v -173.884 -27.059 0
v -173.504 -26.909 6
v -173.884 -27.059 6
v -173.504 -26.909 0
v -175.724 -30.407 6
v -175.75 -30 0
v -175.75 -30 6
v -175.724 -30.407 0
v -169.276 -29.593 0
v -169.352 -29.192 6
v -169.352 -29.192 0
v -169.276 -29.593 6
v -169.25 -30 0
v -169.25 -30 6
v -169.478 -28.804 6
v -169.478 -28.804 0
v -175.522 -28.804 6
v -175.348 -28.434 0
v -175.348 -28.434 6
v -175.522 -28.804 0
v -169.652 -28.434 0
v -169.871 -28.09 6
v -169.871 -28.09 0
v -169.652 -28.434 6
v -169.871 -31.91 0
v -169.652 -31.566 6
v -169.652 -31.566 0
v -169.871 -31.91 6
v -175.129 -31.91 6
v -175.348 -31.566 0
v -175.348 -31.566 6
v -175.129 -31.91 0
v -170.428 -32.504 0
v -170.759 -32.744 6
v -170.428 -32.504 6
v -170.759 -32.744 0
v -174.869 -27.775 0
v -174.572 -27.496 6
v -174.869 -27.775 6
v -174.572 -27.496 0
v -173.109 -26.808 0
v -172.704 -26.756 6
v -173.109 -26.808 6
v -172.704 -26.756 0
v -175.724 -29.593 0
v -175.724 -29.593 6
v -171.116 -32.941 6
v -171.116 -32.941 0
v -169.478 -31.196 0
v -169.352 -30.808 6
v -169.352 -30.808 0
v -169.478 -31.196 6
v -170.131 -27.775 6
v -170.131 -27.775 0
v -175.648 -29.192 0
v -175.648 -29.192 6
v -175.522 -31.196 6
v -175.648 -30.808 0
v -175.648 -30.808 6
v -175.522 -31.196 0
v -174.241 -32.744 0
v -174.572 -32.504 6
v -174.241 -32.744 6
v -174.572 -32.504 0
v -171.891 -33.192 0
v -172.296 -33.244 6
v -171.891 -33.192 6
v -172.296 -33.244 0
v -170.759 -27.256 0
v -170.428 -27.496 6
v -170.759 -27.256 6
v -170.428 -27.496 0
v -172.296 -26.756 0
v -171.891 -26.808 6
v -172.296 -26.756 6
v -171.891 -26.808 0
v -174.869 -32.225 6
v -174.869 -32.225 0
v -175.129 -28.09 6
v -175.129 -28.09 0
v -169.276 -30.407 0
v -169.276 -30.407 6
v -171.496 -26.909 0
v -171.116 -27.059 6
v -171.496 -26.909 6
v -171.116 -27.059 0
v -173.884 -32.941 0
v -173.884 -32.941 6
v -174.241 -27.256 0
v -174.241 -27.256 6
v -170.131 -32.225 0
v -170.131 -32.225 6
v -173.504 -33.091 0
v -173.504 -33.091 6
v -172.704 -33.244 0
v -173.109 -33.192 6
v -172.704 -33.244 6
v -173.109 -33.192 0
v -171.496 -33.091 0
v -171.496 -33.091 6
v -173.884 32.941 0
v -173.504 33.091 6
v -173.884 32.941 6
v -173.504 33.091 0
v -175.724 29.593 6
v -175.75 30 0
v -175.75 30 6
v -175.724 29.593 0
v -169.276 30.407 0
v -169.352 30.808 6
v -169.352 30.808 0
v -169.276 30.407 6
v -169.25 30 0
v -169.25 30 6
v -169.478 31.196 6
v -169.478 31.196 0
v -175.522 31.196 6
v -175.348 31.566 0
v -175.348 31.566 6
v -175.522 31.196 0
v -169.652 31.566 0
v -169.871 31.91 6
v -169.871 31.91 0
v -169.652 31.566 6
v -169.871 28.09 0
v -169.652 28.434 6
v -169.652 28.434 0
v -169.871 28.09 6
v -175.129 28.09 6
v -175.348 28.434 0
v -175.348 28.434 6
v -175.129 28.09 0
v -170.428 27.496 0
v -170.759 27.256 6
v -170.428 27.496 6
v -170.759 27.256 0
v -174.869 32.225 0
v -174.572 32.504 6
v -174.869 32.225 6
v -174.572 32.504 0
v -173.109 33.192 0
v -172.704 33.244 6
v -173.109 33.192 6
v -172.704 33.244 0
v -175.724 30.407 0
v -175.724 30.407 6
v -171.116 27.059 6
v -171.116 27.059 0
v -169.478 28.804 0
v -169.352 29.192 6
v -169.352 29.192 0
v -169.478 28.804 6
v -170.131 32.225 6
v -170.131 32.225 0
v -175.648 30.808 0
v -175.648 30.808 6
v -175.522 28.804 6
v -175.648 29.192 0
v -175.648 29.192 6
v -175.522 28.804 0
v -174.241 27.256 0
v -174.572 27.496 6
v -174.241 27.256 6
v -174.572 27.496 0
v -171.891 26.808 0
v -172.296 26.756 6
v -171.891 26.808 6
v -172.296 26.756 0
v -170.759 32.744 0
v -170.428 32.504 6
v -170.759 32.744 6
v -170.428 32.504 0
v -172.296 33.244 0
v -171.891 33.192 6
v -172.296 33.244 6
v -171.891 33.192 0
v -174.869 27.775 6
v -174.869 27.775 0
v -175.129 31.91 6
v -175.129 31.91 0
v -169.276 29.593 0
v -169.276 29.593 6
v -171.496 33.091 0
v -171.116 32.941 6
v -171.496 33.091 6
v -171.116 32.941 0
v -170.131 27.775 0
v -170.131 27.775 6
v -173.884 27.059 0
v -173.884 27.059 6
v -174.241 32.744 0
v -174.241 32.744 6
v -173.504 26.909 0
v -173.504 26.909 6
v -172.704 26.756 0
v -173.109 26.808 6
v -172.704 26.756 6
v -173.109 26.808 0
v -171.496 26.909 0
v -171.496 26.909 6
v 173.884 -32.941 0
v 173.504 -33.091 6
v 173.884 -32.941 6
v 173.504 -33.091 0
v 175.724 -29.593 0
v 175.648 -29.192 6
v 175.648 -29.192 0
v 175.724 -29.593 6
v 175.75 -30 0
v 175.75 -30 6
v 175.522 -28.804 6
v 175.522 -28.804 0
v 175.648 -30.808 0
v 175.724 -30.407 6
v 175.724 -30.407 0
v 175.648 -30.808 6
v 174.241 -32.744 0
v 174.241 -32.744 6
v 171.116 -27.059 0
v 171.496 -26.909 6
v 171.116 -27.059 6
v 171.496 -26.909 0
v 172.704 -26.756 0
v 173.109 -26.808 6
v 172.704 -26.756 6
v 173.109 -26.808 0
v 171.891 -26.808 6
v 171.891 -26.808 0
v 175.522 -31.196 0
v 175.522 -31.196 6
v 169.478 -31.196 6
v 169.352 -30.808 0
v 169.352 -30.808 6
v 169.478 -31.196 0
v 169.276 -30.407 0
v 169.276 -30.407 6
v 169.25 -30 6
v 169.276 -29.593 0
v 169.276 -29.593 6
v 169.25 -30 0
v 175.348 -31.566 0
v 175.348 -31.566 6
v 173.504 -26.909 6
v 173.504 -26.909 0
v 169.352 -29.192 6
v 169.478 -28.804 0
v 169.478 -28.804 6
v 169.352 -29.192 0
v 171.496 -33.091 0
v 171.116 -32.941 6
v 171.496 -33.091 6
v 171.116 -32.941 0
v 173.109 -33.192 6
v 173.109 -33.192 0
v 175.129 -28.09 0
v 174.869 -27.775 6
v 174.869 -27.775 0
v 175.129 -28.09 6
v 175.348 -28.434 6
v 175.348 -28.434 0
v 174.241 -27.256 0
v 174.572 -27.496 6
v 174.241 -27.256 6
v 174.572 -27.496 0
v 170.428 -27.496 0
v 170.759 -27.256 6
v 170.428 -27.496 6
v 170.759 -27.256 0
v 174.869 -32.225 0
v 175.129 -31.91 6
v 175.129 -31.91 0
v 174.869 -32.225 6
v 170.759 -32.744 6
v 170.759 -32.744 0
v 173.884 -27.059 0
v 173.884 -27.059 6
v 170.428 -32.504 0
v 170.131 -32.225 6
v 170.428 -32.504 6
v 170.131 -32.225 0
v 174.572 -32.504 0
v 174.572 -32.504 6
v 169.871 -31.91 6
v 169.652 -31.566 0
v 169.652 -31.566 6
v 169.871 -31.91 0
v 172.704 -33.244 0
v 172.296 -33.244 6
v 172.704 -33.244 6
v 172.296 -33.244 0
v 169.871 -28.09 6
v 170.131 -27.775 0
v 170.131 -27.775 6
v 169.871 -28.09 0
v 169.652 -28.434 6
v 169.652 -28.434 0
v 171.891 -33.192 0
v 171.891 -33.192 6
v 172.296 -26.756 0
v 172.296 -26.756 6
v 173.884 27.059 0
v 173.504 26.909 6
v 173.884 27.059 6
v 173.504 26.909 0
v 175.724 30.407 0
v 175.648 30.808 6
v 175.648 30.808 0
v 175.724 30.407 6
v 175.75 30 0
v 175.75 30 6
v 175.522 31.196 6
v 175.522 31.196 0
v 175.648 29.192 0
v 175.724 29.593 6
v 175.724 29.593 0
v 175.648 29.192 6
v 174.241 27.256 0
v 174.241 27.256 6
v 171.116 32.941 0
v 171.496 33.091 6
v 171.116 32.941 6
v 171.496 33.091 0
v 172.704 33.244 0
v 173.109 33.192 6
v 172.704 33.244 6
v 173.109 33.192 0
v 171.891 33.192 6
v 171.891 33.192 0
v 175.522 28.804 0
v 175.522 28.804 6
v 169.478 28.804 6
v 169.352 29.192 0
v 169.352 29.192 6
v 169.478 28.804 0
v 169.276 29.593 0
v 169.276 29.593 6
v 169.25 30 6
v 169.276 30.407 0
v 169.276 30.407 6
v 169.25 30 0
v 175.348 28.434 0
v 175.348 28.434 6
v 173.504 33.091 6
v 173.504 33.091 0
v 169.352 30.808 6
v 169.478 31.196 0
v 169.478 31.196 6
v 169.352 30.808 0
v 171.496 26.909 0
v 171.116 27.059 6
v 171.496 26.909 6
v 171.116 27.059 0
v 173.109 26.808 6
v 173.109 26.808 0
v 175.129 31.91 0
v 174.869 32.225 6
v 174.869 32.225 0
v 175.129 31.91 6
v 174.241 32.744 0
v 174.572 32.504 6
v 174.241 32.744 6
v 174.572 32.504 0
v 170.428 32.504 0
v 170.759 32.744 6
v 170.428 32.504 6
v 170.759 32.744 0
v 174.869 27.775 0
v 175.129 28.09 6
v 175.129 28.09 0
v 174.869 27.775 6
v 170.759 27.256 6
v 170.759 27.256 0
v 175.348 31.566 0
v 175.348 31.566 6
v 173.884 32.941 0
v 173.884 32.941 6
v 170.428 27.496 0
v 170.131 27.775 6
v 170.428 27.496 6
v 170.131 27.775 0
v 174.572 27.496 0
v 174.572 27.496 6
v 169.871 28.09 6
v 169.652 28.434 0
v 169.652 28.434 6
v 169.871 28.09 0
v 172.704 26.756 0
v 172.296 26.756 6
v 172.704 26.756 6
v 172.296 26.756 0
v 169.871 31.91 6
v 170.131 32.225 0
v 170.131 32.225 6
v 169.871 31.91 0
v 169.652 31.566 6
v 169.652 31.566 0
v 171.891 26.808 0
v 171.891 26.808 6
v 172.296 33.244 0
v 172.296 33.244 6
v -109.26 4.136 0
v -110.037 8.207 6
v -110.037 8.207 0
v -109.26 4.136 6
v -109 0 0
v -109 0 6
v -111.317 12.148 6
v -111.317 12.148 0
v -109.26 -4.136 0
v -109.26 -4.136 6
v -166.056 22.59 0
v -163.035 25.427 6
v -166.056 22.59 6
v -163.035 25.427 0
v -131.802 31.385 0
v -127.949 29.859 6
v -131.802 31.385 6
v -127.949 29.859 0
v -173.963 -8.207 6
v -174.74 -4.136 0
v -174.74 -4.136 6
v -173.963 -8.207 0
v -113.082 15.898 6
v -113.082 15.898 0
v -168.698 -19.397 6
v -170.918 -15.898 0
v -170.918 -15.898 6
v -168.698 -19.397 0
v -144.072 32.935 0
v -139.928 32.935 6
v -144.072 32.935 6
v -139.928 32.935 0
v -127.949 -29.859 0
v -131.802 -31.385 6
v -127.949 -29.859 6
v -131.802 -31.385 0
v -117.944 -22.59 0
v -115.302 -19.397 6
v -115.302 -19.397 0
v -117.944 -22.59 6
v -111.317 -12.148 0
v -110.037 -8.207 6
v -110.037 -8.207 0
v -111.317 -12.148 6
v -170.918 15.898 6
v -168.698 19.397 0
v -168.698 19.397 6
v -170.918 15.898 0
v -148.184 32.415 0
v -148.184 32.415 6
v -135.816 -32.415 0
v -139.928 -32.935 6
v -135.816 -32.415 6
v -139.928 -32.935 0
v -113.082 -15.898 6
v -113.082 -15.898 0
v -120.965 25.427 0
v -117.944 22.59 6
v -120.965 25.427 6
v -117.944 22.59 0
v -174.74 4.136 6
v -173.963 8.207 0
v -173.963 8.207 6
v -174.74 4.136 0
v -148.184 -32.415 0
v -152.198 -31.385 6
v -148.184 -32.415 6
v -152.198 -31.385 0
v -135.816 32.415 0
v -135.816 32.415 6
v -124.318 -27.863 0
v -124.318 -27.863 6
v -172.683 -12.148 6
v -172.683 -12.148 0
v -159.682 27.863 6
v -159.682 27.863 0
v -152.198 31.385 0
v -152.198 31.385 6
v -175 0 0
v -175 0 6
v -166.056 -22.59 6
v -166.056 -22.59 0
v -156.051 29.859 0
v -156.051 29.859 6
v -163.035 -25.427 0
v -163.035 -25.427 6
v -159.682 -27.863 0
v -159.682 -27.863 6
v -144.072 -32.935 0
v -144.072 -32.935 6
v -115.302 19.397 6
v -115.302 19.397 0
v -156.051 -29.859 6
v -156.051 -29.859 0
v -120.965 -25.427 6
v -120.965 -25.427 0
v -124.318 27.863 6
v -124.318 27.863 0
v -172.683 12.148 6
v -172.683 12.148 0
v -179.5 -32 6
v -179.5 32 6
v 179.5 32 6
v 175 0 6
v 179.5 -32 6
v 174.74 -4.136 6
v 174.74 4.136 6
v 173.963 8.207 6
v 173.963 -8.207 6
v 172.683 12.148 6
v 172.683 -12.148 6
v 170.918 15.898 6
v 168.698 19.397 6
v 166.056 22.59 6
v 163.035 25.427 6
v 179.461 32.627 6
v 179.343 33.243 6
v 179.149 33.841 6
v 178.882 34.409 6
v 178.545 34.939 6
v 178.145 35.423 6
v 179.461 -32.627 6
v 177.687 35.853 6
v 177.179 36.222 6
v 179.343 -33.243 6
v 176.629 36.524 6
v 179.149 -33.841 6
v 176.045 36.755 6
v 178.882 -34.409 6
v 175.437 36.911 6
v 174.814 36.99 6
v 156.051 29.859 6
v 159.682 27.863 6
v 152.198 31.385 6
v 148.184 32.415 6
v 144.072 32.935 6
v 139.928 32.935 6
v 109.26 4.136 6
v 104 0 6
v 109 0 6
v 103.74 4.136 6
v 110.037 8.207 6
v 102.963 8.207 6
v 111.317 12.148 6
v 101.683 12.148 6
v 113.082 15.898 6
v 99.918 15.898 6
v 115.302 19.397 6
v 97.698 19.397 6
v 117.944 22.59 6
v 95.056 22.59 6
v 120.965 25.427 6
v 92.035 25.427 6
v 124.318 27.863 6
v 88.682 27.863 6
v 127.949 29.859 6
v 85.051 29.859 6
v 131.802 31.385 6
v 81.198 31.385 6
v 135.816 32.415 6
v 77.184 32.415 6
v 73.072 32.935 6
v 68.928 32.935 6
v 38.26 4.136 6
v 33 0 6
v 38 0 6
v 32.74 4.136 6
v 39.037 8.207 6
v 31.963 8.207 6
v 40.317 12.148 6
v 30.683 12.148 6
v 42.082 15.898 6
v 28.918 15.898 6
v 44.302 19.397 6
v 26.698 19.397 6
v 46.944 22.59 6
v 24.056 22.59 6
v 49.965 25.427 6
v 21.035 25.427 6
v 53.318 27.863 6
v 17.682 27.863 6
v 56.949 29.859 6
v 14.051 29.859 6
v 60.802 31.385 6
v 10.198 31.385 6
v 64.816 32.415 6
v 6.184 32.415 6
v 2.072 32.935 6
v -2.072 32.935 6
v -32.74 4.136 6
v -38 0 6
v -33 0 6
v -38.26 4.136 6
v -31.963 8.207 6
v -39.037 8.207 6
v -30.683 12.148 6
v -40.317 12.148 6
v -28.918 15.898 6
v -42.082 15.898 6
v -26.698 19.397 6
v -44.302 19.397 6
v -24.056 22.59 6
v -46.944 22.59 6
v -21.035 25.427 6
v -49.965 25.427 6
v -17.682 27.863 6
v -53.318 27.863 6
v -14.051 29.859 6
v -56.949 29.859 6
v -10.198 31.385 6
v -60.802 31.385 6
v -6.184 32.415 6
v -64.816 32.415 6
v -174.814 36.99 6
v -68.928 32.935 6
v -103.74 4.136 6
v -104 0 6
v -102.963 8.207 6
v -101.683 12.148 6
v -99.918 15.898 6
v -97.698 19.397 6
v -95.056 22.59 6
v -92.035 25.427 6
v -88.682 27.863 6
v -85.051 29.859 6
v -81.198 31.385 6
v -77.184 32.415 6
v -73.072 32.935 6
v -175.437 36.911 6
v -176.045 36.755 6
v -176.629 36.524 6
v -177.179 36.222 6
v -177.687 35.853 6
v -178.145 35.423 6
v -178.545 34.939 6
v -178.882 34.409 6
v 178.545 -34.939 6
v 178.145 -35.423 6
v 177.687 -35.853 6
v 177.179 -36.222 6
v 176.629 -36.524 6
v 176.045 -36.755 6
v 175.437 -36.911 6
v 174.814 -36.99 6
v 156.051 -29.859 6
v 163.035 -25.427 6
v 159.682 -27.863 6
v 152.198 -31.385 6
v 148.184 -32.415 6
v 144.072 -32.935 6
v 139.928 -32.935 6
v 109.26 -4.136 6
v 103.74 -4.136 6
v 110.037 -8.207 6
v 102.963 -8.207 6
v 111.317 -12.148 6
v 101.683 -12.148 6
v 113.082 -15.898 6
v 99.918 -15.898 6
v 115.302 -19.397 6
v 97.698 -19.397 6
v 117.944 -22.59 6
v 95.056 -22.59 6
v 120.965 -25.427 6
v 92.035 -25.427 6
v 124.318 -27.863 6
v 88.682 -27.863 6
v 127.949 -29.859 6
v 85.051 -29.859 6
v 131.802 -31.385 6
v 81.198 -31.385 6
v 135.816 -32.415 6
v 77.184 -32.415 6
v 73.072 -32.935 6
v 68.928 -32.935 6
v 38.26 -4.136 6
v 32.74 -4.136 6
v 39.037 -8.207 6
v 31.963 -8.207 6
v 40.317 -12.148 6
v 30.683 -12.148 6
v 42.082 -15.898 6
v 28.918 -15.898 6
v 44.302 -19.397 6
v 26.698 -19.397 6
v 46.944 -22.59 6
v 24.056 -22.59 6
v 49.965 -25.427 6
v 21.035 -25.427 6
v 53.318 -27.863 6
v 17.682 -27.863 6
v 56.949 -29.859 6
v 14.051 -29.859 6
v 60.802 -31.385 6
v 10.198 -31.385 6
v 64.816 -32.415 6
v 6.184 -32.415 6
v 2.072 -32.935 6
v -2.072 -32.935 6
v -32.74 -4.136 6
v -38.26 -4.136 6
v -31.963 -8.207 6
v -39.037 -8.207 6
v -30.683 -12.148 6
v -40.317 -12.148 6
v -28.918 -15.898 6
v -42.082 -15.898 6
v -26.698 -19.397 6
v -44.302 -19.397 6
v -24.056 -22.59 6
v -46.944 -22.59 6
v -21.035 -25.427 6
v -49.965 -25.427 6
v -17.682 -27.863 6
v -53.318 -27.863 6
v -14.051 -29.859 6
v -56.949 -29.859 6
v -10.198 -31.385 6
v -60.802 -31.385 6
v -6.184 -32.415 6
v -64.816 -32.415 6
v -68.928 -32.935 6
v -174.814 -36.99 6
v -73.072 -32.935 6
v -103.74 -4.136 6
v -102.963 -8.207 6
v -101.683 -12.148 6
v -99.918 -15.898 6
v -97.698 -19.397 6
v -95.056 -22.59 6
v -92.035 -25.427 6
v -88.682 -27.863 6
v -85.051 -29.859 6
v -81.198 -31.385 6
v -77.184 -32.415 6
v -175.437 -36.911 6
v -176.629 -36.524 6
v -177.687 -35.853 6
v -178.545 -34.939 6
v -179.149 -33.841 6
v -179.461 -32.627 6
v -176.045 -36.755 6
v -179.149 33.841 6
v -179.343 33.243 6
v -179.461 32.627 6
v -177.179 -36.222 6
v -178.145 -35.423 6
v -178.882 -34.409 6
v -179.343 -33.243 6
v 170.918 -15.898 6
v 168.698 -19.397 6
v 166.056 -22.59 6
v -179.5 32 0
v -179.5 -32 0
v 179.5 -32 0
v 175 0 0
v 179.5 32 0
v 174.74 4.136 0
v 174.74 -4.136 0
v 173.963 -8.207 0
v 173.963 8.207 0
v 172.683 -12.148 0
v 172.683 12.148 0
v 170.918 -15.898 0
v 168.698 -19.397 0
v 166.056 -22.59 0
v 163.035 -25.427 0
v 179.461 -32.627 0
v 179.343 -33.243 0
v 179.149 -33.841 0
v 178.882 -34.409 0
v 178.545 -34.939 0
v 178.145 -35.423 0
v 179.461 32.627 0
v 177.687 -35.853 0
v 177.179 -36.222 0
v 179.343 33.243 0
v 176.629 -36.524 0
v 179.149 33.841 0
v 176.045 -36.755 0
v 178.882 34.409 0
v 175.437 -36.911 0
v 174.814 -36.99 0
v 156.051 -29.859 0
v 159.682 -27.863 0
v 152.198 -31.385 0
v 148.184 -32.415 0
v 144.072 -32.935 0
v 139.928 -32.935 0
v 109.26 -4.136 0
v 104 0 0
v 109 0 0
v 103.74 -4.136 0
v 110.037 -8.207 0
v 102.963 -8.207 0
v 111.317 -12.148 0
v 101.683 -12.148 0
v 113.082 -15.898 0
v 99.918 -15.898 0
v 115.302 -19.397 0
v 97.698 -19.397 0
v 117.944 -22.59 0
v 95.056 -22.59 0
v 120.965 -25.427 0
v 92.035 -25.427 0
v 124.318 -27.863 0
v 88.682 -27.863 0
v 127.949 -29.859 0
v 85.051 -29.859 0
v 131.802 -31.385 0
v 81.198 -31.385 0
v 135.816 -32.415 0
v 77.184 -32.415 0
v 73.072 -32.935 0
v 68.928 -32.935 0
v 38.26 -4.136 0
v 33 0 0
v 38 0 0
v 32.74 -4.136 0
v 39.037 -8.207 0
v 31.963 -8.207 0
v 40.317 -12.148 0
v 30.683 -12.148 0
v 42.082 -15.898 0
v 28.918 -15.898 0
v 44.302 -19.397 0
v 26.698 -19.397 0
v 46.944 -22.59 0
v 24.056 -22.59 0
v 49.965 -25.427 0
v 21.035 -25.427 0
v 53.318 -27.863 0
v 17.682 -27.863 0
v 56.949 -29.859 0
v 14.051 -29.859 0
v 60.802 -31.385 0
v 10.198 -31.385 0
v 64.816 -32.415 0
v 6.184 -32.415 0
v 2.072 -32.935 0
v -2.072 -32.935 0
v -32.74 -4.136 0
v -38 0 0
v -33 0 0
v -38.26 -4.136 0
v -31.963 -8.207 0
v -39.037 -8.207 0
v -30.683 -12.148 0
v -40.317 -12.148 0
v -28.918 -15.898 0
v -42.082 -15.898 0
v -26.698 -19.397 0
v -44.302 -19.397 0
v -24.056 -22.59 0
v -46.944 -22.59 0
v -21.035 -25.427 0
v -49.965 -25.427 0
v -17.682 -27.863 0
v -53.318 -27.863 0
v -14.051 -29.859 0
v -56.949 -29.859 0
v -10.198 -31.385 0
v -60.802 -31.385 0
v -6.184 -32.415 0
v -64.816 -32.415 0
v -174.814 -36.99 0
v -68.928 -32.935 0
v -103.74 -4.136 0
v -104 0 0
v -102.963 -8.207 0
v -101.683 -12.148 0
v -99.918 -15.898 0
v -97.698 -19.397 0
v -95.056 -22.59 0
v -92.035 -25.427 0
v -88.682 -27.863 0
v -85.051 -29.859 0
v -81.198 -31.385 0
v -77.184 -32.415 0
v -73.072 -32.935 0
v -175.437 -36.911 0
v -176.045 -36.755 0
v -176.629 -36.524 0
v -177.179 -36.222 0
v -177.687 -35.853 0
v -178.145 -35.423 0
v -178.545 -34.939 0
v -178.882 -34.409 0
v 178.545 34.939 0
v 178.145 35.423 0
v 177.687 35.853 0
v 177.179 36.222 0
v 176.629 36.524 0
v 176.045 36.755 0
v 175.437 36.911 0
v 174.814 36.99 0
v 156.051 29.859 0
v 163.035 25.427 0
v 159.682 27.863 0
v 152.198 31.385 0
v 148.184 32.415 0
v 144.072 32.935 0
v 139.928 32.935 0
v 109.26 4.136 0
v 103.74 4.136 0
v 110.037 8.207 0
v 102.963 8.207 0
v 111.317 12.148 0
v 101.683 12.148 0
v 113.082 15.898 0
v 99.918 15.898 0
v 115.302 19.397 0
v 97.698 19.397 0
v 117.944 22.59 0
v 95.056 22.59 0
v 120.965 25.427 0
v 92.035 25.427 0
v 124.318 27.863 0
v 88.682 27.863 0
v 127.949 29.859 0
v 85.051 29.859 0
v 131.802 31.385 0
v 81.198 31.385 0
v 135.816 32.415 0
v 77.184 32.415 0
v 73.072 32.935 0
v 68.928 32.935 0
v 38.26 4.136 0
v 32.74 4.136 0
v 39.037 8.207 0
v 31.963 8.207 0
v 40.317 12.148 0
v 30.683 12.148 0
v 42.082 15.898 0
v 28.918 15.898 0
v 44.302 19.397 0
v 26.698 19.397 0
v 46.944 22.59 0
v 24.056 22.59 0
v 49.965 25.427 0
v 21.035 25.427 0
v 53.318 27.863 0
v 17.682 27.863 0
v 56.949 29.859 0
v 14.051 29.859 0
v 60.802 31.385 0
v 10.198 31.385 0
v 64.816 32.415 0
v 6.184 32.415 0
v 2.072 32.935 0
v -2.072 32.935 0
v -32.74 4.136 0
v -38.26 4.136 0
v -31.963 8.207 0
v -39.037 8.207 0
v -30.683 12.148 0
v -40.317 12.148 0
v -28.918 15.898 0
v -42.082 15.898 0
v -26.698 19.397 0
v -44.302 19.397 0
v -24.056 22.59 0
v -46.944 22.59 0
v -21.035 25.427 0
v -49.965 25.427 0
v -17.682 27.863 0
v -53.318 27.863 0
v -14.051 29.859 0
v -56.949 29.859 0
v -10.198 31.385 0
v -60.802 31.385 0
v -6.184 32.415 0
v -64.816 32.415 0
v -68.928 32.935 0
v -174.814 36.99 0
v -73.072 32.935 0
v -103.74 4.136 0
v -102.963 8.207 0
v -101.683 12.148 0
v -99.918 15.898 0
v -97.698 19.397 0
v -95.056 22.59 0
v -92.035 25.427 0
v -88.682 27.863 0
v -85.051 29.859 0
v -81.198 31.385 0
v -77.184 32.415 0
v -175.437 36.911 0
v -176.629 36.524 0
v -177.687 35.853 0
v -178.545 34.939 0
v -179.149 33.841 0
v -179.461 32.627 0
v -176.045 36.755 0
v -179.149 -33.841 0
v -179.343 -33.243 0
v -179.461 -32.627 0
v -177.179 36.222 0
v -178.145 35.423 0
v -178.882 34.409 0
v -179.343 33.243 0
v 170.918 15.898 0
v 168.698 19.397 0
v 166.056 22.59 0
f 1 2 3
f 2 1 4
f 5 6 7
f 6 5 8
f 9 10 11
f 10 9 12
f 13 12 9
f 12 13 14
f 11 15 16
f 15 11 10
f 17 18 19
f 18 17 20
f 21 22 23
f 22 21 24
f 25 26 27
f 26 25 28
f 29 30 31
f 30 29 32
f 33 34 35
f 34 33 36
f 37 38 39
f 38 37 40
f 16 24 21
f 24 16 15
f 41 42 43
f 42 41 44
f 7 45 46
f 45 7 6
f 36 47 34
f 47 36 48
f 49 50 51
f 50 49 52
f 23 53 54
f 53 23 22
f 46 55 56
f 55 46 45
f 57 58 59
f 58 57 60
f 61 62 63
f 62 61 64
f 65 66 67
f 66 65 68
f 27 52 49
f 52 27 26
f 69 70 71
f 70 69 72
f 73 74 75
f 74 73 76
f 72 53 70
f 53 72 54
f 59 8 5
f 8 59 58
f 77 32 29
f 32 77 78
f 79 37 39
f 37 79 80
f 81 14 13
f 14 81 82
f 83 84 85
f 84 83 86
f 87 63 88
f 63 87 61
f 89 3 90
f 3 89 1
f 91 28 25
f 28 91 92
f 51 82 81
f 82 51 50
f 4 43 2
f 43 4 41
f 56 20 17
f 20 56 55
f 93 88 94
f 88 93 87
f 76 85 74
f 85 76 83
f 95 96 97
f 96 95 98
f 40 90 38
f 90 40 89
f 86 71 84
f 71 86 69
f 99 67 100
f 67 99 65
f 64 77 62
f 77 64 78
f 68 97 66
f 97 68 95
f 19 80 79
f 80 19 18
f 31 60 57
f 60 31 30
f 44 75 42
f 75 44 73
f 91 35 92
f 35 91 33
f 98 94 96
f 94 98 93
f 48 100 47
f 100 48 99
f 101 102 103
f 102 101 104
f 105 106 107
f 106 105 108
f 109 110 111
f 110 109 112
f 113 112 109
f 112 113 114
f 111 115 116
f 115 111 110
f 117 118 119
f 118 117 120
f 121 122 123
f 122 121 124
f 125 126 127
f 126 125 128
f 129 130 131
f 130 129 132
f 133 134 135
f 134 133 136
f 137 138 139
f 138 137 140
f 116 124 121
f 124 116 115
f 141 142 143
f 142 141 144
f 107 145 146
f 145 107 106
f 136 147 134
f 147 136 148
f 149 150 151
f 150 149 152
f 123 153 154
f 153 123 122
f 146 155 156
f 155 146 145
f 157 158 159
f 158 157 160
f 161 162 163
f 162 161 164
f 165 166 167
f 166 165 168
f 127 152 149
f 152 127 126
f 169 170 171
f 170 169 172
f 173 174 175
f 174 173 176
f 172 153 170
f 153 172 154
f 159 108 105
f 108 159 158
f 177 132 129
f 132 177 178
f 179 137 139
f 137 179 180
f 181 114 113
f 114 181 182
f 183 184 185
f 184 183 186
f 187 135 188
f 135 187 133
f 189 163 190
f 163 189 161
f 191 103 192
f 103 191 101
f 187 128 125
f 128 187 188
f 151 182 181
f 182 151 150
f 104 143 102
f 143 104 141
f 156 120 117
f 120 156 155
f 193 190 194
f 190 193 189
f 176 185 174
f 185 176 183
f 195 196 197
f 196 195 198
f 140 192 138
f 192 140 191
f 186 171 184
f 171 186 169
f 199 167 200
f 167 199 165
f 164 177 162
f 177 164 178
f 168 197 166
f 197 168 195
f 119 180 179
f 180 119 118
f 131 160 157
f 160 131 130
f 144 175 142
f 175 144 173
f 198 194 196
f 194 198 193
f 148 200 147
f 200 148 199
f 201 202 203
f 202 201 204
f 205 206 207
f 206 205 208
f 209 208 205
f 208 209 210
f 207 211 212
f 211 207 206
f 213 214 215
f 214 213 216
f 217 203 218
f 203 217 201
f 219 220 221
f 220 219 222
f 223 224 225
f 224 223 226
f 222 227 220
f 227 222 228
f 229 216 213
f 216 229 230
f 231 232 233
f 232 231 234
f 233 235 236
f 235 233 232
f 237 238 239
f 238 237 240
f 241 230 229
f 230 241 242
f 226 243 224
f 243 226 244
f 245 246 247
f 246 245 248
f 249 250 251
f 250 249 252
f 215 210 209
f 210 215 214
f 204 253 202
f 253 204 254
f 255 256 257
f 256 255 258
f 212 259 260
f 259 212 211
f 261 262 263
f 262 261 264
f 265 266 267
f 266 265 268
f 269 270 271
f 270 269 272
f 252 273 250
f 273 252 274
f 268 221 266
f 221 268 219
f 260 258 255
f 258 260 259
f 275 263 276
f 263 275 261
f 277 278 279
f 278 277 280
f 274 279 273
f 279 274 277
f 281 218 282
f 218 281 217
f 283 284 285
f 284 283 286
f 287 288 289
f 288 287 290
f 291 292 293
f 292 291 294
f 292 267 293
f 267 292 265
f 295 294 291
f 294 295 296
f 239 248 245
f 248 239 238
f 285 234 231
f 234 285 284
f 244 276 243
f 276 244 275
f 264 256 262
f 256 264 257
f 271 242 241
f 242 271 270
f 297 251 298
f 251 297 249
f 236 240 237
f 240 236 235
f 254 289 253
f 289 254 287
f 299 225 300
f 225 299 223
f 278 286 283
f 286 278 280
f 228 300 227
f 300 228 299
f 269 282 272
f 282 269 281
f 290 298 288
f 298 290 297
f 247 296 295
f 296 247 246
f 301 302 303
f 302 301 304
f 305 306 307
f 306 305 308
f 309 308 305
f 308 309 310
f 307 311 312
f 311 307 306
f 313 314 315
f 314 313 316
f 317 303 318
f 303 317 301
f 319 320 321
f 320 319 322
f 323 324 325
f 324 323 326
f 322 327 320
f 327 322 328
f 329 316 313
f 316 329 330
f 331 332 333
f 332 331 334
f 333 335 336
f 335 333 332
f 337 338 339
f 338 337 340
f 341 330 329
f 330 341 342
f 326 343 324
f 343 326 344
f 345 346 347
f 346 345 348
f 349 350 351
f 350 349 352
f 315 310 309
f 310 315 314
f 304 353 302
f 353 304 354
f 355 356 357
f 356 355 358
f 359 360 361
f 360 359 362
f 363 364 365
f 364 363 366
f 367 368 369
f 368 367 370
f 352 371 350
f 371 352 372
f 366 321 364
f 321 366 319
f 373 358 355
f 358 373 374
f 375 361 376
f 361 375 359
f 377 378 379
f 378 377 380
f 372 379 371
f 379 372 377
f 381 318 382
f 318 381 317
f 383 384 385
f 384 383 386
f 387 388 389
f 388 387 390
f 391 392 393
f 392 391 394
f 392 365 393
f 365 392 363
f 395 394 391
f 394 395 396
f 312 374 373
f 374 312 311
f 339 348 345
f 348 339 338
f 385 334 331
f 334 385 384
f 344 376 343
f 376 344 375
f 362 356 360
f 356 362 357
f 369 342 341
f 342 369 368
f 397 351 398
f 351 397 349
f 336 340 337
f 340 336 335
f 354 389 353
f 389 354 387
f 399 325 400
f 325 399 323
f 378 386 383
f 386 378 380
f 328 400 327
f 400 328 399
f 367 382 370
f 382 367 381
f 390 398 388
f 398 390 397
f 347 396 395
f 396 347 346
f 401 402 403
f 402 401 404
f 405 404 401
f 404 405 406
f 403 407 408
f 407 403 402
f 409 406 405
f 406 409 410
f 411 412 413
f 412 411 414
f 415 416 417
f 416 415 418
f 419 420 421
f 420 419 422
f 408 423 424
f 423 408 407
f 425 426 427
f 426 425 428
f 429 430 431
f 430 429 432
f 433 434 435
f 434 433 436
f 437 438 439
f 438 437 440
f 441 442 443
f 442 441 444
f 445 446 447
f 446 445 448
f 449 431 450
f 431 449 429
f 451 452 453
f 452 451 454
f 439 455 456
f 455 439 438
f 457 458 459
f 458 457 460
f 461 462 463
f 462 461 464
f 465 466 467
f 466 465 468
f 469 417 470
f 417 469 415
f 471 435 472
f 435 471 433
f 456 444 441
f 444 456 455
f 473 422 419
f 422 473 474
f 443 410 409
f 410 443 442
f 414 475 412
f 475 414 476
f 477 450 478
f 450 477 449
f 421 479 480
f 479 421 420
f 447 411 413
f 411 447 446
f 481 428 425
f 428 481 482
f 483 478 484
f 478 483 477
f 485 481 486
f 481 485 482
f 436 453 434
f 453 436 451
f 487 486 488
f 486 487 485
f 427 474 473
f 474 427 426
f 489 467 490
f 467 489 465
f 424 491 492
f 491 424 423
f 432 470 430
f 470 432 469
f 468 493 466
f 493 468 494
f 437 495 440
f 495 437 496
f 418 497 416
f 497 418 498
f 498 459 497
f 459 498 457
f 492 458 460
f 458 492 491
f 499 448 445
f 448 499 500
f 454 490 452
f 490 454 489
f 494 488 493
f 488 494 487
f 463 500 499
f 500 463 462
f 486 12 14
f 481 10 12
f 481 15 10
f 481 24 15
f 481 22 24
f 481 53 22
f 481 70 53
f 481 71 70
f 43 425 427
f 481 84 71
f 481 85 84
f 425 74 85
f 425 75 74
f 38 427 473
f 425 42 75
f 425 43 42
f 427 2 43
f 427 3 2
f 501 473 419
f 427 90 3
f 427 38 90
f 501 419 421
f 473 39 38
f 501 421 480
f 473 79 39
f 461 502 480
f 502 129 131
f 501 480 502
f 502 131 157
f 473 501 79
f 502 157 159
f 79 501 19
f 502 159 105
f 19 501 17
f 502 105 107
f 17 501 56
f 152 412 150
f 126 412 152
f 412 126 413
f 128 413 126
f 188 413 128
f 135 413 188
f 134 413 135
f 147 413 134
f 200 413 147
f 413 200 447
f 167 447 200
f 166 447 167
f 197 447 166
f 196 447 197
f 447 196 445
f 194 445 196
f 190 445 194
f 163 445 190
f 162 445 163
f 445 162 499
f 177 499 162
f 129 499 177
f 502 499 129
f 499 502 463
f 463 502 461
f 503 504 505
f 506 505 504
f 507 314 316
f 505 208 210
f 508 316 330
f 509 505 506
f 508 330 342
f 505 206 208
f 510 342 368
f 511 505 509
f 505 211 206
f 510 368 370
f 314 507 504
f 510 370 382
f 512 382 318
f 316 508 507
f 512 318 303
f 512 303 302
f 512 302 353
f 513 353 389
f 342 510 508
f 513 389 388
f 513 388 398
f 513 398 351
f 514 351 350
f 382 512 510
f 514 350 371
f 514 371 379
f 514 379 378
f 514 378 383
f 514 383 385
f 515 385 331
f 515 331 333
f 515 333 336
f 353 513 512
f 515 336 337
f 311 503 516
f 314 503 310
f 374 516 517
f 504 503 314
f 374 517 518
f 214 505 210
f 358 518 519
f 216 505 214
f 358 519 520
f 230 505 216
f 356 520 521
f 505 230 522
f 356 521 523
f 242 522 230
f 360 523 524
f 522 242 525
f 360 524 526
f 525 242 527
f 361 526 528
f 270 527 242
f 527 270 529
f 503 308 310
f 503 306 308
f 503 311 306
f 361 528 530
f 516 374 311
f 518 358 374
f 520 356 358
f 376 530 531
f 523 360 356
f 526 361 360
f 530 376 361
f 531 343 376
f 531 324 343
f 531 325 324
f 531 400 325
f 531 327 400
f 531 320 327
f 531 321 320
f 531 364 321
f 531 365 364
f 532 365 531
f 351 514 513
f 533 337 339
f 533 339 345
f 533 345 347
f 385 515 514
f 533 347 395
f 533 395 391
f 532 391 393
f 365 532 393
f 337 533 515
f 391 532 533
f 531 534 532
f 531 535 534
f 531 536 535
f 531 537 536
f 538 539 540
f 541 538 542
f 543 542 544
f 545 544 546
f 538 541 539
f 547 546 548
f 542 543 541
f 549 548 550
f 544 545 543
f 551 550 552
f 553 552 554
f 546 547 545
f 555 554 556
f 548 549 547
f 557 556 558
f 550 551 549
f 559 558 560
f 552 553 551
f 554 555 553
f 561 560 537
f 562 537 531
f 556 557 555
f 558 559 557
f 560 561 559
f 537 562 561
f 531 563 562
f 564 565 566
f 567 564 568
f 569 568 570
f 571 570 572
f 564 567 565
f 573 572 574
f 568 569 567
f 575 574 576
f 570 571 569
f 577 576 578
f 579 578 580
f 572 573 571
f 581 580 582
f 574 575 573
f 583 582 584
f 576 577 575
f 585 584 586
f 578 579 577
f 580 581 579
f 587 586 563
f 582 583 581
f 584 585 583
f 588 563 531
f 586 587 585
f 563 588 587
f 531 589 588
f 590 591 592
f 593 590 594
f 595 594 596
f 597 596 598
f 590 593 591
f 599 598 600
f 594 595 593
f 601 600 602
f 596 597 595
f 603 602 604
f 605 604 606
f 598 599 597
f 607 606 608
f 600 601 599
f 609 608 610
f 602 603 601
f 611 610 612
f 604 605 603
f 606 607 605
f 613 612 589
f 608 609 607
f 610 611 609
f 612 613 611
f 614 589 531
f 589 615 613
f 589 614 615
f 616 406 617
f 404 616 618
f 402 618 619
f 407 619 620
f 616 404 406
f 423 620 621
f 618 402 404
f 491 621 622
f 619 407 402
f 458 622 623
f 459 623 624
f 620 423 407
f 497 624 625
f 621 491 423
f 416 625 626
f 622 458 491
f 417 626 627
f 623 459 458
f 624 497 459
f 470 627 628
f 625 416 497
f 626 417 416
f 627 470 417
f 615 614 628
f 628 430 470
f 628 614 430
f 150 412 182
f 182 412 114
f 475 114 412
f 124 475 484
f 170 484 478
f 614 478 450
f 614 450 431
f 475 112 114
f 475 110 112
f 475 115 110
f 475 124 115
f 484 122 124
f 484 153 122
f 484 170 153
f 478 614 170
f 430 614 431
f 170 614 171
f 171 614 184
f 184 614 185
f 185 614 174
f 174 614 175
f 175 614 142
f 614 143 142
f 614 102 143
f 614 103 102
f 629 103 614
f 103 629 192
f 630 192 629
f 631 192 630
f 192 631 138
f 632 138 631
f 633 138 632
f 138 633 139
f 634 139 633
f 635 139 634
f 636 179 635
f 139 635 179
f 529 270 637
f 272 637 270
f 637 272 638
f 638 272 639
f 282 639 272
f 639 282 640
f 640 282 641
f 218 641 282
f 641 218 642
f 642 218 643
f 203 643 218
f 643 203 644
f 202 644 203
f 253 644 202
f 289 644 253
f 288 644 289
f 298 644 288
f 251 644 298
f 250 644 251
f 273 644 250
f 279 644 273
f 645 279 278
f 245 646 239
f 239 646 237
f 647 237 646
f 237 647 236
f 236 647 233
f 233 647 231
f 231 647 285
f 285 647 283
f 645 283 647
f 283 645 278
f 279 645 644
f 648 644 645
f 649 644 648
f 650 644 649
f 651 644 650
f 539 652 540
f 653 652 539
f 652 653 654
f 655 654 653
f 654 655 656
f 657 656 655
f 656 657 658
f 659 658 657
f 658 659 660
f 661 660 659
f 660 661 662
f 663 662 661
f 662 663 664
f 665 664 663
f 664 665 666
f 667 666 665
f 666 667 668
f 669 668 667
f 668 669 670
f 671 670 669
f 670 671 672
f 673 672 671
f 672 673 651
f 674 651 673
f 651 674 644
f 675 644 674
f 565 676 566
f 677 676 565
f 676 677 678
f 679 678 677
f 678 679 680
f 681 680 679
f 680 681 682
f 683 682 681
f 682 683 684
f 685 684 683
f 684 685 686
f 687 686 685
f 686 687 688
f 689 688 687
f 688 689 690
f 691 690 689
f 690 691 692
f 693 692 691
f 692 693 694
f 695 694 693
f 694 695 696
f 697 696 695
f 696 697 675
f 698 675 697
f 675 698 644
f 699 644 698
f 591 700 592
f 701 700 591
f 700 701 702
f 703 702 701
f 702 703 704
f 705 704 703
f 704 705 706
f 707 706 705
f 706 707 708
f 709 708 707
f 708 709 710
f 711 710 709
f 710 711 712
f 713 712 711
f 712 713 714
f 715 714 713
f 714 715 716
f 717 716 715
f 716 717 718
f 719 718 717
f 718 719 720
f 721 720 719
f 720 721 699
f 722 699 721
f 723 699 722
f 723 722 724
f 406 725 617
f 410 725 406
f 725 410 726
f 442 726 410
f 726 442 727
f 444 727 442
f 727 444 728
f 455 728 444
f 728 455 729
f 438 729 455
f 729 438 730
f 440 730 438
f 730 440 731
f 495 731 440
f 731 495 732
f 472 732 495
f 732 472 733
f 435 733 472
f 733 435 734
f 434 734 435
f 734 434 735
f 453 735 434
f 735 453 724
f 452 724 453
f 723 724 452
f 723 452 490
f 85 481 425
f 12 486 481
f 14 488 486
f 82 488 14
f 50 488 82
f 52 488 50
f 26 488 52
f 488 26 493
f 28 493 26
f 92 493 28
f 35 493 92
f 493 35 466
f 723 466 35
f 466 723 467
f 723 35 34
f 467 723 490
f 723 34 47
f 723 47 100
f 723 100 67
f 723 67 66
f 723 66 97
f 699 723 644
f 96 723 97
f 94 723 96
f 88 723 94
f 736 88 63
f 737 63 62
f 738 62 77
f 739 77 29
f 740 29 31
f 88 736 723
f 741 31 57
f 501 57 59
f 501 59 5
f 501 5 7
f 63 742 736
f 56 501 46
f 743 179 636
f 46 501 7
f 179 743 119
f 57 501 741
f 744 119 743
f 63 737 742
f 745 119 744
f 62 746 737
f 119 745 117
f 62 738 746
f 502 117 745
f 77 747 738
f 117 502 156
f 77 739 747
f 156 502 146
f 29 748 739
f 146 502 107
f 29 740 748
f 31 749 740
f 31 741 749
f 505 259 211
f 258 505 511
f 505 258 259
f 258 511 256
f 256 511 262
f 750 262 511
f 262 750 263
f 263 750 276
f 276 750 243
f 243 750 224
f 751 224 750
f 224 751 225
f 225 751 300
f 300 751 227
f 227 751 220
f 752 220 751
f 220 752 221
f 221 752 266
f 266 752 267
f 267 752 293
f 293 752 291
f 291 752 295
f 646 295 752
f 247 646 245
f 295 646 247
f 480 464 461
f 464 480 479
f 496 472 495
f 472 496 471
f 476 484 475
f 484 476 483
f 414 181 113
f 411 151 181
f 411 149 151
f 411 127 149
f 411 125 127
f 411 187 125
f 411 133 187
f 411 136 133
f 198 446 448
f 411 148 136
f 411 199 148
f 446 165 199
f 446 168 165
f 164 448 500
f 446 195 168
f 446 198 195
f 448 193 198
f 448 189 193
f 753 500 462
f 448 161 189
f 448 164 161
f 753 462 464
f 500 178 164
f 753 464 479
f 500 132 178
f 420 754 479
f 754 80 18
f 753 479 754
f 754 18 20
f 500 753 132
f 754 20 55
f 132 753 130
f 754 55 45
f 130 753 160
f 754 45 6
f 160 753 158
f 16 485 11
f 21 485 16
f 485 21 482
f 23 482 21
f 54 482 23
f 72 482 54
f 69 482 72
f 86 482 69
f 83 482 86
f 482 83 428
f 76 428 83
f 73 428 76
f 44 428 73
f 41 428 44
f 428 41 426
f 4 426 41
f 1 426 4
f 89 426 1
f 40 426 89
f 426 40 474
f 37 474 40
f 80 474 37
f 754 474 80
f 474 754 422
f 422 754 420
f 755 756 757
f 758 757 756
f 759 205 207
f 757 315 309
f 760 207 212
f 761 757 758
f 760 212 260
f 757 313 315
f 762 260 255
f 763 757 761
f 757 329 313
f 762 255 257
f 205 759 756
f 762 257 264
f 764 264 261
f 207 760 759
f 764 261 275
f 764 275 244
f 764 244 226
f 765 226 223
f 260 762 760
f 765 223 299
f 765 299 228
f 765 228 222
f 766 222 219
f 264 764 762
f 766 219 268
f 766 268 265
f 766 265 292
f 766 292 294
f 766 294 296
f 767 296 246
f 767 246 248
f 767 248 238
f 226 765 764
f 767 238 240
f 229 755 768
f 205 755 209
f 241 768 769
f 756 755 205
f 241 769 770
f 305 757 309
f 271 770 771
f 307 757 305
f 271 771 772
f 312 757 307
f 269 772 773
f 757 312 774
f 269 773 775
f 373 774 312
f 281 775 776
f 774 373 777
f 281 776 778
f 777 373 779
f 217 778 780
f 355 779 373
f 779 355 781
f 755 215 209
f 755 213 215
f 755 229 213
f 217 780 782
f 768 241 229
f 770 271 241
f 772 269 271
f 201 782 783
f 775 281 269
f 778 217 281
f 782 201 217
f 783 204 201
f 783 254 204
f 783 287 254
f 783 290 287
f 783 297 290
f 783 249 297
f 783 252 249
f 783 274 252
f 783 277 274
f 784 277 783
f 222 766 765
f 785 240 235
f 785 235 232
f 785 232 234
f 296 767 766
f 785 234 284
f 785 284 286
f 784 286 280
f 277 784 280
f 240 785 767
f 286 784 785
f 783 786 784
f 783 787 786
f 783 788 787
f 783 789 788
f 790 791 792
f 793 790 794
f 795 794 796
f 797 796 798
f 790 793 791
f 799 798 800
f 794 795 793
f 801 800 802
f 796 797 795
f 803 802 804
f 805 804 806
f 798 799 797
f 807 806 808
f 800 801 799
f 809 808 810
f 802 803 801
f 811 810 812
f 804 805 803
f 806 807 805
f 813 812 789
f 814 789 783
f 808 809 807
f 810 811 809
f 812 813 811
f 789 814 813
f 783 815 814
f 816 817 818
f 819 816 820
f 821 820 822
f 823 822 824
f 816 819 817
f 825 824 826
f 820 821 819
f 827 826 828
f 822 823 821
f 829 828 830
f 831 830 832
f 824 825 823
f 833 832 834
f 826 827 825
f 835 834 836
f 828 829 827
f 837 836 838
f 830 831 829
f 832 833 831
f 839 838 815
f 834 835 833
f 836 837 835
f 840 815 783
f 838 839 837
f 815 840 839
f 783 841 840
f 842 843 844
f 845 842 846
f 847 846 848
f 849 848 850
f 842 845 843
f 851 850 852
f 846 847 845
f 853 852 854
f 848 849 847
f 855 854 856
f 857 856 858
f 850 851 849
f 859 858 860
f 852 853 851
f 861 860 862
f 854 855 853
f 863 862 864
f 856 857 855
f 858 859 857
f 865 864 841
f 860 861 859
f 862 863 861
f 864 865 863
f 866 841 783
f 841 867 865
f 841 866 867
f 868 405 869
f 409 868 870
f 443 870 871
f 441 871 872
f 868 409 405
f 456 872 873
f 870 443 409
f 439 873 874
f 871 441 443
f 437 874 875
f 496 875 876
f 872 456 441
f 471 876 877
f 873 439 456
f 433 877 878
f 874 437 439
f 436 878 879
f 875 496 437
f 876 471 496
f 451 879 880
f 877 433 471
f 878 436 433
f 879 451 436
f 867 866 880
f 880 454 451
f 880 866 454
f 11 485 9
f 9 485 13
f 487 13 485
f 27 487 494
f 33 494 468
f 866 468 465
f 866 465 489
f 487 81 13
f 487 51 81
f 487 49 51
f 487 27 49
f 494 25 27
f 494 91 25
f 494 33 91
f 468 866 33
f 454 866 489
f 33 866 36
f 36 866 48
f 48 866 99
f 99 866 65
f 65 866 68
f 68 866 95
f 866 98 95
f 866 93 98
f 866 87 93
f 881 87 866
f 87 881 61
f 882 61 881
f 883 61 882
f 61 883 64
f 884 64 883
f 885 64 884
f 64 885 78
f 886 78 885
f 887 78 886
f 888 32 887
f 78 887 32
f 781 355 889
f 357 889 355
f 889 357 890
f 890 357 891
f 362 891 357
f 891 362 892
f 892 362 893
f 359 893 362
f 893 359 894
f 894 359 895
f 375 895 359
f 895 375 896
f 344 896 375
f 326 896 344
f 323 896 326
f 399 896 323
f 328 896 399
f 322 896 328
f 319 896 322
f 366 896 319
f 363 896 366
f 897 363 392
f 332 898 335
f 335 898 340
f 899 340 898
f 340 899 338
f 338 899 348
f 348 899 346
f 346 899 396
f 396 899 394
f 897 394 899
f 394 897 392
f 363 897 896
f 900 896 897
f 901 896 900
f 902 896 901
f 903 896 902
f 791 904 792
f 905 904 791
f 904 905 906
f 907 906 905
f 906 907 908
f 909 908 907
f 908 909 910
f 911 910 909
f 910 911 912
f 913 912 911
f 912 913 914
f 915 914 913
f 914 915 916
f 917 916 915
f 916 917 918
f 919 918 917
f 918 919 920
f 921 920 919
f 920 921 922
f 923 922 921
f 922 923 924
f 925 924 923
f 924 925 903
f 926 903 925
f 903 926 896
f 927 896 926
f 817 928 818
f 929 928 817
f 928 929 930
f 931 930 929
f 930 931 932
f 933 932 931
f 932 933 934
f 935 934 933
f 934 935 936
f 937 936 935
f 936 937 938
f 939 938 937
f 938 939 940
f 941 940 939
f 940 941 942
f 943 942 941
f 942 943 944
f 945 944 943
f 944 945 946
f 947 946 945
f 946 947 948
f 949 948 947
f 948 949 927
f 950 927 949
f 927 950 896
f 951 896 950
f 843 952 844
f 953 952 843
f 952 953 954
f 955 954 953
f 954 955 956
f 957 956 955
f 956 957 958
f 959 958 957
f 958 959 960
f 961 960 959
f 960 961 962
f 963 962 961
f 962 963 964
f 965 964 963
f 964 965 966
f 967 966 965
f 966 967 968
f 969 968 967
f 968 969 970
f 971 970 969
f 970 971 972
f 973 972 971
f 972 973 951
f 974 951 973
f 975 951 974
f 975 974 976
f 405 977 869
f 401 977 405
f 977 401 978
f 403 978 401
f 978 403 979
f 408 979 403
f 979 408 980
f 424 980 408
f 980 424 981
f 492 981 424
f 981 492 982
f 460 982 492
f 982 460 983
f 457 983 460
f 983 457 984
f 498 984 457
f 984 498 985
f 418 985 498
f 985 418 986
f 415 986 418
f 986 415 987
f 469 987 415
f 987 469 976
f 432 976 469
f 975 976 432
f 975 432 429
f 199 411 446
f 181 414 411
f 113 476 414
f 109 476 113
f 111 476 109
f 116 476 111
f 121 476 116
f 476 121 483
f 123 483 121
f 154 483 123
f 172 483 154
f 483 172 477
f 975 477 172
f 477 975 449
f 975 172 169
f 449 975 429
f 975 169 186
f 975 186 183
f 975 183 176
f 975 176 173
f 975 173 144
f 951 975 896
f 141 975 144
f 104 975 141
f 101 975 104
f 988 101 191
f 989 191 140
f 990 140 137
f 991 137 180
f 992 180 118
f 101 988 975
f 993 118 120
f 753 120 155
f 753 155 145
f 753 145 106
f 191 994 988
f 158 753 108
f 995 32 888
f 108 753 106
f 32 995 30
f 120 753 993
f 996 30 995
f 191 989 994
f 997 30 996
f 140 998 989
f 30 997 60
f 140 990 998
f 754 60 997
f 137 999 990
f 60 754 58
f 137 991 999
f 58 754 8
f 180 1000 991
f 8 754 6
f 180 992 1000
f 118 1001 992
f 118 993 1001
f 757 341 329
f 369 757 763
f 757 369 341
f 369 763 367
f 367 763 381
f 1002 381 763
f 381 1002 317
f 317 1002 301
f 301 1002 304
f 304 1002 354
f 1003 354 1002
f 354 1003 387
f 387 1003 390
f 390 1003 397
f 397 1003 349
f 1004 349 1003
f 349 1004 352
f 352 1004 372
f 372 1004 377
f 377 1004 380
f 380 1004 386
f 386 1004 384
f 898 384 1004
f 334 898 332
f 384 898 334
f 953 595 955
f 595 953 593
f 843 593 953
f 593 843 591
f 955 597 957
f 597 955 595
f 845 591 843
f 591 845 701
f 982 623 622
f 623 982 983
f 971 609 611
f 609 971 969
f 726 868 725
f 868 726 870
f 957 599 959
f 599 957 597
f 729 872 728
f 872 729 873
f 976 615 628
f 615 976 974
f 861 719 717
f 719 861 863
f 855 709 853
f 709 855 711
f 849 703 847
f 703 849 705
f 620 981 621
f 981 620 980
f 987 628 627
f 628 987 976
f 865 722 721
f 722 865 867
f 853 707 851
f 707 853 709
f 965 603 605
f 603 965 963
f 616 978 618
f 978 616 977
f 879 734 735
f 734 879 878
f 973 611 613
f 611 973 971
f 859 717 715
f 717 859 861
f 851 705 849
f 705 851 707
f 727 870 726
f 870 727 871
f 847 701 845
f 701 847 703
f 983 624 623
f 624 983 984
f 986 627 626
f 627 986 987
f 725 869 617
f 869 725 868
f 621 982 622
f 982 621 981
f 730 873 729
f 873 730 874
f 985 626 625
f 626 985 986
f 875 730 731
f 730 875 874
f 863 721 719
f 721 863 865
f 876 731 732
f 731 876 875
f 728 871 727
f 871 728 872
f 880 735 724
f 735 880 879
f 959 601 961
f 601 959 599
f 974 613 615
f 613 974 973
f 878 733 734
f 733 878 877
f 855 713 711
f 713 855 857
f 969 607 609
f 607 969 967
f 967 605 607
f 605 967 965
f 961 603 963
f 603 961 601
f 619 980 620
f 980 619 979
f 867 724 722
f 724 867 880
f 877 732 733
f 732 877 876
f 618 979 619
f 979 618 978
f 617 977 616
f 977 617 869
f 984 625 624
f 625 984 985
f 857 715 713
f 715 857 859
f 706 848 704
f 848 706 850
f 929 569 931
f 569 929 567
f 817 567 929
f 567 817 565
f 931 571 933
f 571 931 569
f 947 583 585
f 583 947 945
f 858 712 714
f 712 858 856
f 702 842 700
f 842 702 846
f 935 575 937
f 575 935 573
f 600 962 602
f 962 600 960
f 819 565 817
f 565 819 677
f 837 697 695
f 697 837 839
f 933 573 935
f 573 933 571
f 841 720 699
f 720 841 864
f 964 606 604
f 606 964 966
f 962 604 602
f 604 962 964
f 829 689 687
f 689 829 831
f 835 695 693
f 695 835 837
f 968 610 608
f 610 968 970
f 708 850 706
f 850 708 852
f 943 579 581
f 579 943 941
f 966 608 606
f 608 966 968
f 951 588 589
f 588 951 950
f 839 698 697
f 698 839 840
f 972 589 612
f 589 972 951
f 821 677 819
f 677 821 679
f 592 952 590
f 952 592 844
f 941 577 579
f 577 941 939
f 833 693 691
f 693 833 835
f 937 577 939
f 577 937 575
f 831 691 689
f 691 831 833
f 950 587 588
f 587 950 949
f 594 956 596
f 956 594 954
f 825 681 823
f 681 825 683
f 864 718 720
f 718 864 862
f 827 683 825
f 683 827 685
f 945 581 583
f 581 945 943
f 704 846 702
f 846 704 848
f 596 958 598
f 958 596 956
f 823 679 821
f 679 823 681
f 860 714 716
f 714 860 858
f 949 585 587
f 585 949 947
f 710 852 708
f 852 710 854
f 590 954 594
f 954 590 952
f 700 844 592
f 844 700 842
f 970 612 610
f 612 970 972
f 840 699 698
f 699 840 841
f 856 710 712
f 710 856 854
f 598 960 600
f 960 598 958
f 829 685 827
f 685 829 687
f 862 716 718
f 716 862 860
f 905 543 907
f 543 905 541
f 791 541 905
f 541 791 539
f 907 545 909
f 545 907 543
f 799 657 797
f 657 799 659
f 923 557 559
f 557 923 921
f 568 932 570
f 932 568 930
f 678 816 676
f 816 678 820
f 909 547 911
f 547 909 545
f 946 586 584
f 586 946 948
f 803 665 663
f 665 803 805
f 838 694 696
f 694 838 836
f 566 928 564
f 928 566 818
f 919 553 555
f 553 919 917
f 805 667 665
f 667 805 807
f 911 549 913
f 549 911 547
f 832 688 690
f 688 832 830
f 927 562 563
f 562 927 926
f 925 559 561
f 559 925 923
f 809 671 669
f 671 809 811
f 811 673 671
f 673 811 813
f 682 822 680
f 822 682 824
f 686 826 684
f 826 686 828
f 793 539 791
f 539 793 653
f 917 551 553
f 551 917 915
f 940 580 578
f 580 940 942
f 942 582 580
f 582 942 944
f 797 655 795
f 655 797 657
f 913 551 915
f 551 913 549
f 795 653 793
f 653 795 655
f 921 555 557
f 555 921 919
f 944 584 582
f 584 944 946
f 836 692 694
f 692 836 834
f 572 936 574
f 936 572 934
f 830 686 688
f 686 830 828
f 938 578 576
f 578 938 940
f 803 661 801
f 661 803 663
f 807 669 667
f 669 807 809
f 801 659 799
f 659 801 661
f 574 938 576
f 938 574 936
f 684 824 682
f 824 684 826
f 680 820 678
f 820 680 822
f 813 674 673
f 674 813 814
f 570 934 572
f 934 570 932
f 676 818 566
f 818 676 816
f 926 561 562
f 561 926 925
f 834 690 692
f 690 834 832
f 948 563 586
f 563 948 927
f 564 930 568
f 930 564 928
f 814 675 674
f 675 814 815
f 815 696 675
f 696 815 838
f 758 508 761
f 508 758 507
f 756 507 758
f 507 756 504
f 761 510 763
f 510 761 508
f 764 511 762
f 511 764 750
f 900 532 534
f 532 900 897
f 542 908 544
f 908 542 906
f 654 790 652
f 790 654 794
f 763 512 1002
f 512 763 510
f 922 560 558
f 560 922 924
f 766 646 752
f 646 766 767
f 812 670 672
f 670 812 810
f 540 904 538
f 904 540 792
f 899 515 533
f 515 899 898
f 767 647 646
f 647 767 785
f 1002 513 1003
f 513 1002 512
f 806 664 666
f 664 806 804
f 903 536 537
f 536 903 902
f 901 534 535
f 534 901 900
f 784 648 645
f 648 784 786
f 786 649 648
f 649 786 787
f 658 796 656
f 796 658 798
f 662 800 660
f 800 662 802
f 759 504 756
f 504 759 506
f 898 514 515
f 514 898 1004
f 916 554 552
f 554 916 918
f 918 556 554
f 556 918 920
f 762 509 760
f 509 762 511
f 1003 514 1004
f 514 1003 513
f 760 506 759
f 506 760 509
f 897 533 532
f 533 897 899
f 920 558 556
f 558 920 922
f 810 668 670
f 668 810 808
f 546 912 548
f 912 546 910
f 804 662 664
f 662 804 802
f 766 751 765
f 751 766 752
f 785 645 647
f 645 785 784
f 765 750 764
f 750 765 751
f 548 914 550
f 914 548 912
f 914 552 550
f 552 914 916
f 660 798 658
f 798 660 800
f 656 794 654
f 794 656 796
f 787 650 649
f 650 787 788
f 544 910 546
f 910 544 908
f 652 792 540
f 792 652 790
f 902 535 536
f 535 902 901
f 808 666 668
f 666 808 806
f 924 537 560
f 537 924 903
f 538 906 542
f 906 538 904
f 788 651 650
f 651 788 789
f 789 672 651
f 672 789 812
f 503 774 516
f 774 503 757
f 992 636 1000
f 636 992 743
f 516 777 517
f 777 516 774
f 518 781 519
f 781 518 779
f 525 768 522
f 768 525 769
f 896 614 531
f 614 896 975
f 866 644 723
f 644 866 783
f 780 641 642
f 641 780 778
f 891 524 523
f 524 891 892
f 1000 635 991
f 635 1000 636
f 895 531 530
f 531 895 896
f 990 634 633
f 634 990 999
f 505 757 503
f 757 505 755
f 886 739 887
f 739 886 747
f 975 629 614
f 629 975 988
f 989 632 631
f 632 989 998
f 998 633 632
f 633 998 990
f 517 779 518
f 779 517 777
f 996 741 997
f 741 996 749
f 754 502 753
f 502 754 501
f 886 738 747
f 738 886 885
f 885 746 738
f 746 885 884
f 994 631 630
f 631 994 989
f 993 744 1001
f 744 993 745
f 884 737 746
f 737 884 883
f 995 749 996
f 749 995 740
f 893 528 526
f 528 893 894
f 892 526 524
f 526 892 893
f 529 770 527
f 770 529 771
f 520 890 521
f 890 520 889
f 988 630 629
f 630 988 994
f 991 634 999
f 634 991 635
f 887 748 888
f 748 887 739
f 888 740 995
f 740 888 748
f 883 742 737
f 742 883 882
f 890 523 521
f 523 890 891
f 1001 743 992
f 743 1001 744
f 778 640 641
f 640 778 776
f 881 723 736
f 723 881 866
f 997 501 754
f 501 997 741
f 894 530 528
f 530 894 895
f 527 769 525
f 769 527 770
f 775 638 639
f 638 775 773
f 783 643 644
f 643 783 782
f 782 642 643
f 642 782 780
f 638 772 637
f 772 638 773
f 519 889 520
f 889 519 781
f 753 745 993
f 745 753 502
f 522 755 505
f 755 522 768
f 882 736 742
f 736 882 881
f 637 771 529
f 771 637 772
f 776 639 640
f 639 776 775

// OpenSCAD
$fn = 50;


difference() {
	union() {
		hull() {
			translate(v = [-174.5000000000, 32.0000000000, 0]) {
				cylinder(h = 6, r = 5);
			}
			translate(v = [174.5000000000, 32.0000000000, 0]) {
				cylinder(h = 6, r = 5);
			}
			translate(v = [-174.5000000000, -32.0000000000, 0]) {
				cylinder(h = 6, r = 5);
			}
			translate(v = [174.5000000000, -32.0000000000, 0]) {
				cylinder(h = 6, r = 5);
			}
		}
	}
	union() {
		#translate(v = [-172.5000000000, -30.0000000000, -100.0000000000]) {
			cylinder(h = 200, r = 3.2500000000);
		}
		#translate(v = [-172.5000000000, 30.0000000000, -100.0000000000]) {
			cylinder(h = 200, r = 3.2500000000);
		}
		#translate(v = [172.5000000000, -30.0000000000, -100.0000000000]) {
			cylinder(h = 200, r = 3.2500000000);
		}
		#translate(v = [172.5000000000, 30.0000000000, -100.0000000000]) {
			cylinder(h = 200, r = 3.2500000000);
		}
		#translate(v = [-142.0000000000, 0, 0]) {
			cylinder(h = 6, r = 33.0000000000);
		}
		#translate(v = [-71.0000000000, 0, 0]) {
			cylinder(h = 6, r = 33.0000000000);
		}
		#cylinder(h = 6, r = 33.0000000000);
		#translate(v = [71.0000000000, 0, 0]) {
			cylinder(h = 6, r = 33.0000000000);
		}
		#translate(v = [142.0000000000, 0, 0]) {
			cylinder(h = 6, r = 33.0000000000);
		}
	}
}
